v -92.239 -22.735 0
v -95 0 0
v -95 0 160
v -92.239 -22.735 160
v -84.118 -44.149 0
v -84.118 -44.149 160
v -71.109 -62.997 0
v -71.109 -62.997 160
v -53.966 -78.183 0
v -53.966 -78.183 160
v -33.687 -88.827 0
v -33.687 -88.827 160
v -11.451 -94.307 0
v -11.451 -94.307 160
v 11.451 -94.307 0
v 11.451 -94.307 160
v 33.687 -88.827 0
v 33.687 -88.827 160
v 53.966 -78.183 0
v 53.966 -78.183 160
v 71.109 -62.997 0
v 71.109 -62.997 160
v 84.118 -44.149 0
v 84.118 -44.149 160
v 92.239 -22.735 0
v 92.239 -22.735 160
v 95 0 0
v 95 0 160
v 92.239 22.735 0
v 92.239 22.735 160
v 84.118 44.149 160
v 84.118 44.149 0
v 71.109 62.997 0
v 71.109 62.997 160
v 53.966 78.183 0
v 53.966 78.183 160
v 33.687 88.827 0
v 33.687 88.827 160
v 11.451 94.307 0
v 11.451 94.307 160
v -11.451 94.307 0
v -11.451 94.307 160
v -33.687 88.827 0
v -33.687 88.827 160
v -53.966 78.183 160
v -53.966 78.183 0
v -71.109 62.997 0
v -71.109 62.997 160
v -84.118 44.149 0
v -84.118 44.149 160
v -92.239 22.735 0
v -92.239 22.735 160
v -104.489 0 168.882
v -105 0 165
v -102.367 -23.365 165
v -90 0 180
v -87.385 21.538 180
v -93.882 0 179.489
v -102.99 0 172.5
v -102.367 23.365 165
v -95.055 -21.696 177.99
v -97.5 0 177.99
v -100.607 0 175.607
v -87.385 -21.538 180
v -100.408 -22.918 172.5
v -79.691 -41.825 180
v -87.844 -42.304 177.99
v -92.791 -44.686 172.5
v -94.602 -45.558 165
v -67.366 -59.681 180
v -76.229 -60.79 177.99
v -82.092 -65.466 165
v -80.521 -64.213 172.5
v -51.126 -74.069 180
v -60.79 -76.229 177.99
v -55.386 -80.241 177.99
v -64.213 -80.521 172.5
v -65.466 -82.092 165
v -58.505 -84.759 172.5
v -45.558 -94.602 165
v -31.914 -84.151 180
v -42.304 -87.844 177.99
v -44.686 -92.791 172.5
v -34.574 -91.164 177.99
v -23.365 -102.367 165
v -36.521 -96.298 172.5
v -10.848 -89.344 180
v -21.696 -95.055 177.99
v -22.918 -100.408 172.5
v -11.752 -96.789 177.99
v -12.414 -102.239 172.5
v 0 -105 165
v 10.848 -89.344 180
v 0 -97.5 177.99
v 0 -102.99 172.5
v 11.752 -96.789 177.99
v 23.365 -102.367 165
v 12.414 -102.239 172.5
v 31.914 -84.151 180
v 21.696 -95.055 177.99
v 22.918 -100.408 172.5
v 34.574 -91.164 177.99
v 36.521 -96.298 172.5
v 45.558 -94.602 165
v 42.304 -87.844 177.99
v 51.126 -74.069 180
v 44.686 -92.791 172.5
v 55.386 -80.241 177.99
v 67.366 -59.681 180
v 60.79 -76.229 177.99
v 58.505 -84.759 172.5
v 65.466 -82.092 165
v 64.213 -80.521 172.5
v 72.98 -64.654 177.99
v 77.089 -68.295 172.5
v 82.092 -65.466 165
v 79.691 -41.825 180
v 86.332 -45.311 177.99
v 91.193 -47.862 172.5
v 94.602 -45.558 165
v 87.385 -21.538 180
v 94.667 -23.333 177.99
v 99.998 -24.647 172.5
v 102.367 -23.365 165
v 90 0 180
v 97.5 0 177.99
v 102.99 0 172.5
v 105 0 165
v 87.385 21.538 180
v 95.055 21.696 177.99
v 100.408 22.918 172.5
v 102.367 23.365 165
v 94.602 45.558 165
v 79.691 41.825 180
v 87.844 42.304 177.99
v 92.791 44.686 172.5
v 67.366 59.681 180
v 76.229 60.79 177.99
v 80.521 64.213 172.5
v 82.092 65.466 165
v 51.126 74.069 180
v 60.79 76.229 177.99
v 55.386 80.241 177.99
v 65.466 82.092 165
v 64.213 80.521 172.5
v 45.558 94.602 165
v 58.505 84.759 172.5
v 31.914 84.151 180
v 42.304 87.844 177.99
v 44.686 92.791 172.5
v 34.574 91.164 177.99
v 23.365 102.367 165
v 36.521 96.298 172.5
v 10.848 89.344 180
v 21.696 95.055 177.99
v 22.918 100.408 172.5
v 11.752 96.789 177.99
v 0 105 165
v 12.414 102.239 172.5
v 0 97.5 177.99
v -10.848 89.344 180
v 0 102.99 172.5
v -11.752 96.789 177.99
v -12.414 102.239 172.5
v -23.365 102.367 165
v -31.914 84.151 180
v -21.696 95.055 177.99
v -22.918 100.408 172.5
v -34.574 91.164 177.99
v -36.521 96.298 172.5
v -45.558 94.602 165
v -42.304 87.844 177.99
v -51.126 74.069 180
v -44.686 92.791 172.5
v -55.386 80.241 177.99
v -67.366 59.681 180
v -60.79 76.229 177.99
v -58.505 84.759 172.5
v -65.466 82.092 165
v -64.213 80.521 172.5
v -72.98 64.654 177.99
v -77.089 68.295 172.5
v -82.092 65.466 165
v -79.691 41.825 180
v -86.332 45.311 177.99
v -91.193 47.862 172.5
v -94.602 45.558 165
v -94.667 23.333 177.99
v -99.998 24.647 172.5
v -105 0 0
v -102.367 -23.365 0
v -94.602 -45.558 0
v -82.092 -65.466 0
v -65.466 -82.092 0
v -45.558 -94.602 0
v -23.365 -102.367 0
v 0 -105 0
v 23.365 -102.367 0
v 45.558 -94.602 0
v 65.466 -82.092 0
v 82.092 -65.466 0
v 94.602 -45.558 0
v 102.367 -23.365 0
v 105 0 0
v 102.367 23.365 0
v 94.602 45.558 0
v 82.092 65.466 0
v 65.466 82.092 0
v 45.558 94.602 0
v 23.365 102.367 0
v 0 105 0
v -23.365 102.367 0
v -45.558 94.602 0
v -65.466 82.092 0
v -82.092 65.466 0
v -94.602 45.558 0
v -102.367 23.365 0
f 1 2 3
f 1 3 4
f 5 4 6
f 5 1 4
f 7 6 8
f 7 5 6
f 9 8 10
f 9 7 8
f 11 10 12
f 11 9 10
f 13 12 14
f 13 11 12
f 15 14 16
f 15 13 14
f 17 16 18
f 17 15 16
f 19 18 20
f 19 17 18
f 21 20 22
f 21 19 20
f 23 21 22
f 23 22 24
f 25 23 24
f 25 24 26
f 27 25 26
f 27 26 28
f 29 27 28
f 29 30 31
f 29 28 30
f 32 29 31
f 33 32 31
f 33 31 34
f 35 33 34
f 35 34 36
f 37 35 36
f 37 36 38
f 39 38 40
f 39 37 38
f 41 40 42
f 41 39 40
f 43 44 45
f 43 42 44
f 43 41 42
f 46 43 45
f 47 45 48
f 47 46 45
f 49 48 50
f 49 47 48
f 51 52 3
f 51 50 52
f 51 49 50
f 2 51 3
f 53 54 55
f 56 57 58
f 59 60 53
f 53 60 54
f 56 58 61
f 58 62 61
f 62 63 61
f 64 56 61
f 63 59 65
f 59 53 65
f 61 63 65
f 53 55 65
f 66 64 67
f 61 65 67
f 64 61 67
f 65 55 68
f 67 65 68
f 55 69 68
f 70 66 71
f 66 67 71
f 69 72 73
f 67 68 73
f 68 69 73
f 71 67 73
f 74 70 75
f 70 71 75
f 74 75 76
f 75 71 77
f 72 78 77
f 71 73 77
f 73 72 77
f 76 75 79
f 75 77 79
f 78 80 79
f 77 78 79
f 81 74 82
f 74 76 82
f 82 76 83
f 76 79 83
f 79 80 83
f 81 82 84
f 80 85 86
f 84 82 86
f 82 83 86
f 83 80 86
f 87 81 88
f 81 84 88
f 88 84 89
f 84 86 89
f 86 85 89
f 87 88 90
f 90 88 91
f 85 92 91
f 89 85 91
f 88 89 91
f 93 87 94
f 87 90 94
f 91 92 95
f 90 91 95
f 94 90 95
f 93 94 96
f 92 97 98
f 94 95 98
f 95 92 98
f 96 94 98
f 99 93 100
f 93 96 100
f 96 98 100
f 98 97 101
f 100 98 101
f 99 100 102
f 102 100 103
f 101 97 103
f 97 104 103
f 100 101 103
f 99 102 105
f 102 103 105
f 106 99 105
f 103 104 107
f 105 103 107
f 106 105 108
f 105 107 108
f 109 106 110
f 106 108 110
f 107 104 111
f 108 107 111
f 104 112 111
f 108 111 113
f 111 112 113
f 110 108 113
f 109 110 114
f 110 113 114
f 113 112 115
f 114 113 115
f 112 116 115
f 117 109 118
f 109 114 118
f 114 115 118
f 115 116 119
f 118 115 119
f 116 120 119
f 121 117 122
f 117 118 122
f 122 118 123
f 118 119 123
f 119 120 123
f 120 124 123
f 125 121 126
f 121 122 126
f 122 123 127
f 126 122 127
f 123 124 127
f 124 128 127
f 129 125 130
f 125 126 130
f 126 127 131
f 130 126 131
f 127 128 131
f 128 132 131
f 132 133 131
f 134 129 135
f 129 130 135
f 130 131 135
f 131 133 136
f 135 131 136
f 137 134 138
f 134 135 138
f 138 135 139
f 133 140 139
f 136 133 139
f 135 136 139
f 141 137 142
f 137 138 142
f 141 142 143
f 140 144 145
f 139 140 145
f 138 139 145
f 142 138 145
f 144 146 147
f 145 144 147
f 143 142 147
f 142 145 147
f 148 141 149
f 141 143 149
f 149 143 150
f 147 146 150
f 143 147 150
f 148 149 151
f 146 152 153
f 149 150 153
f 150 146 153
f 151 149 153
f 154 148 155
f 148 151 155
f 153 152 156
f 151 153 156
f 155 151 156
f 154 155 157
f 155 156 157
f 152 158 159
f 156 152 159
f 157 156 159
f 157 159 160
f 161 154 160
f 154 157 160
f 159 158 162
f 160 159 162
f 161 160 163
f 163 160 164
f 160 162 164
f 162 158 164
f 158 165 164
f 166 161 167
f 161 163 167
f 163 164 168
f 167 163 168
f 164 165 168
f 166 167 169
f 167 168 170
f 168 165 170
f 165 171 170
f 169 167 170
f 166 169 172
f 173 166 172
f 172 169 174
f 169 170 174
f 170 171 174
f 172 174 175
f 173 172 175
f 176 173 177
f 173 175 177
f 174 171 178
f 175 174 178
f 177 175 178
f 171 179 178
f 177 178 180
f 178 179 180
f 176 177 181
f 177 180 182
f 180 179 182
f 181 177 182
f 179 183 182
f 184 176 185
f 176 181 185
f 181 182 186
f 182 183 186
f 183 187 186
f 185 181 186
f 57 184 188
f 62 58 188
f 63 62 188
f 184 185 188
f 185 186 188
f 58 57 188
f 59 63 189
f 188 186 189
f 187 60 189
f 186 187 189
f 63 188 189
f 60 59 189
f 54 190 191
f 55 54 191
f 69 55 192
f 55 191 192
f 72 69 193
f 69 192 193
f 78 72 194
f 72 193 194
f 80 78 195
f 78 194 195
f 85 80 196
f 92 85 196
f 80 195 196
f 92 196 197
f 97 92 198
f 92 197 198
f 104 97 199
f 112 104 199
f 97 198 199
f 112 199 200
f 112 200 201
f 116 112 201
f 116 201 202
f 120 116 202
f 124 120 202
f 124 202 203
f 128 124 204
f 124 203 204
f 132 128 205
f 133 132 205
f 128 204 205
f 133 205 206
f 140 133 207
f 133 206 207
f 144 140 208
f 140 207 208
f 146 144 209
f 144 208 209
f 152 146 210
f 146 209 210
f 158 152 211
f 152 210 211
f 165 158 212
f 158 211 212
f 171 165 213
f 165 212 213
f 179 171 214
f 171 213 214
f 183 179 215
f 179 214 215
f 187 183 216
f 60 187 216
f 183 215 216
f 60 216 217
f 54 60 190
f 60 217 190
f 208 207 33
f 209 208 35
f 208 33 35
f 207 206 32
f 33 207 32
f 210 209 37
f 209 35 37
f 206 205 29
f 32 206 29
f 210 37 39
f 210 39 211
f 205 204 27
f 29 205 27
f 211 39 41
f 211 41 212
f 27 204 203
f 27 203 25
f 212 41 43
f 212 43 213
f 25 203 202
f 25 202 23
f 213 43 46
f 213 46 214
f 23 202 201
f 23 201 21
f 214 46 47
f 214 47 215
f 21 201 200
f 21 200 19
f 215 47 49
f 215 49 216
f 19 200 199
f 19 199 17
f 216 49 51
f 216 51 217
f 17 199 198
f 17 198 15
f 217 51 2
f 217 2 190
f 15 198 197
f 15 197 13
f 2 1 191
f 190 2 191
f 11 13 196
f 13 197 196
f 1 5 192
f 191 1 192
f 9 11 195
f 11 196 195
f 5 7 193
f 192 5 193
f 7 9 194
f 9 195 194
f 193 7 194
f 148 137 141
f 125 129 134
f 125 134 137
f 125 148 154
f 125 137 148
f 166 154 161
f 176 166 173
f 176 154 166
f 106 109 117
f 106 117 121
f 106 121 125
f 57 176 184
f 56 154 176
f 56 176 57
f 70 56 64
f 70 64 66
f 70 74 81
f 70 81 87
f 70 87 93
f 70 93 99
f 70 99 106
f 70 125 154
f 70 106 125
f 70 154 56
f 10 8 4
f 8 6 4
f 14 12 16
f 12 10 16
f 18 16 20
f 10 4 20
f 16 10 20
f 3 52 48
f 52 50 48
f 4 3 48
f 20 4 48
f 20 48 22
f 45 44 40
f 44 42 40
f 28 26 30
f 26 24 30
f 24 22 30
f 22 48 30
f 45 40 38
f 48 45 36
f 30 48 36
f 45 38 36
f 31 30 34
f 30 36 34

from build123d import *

# Parameters (mm, degrees)
CROQUIS1_R              = 105
CROQUIS1_R_2            = 95
SALIENTE_EXTRUIR1_DEPTH = 180
CROQUIS2_R              = 101.5
SALIENTE_EXTRUIR2_DEPTH = 20
REDONDEO1_R             = 15


with BuildPart() as part:
    # Croquis1 → Saliente-Extruir1 (new body)
    with BuildSketch(Plane.XY):
        with Locations(Location((0, 0, 0), (0, 0, 180))):
            Circle(CROQUIS1_R)
        with Locations(Location((0, 0, 0), (0, 0, 180))):
            Circle(CROQUIS1_R_2, mode=Mode.SUBTRACT)
    extrude(amount=SALIENTE_EXTRUIR1_DEPTH)

    # Croquis2 → Saliente-Extruir2 (add)
    with BuildSketch(Plane.XY.offset(180)):
        Circle(CROQUIS2_R)
    extrude(amount=-SALIENTE_EXTRUIR2_DEPTH)

    # Redondeo1
    redondeo1_edges = [part.edges().sort_by_distance(p)[0] for p in [
        (105, 0, 180),
    ]]
    fillet(redondeo1_edges, radius=REDONDEO1_R)


solid = part.part
